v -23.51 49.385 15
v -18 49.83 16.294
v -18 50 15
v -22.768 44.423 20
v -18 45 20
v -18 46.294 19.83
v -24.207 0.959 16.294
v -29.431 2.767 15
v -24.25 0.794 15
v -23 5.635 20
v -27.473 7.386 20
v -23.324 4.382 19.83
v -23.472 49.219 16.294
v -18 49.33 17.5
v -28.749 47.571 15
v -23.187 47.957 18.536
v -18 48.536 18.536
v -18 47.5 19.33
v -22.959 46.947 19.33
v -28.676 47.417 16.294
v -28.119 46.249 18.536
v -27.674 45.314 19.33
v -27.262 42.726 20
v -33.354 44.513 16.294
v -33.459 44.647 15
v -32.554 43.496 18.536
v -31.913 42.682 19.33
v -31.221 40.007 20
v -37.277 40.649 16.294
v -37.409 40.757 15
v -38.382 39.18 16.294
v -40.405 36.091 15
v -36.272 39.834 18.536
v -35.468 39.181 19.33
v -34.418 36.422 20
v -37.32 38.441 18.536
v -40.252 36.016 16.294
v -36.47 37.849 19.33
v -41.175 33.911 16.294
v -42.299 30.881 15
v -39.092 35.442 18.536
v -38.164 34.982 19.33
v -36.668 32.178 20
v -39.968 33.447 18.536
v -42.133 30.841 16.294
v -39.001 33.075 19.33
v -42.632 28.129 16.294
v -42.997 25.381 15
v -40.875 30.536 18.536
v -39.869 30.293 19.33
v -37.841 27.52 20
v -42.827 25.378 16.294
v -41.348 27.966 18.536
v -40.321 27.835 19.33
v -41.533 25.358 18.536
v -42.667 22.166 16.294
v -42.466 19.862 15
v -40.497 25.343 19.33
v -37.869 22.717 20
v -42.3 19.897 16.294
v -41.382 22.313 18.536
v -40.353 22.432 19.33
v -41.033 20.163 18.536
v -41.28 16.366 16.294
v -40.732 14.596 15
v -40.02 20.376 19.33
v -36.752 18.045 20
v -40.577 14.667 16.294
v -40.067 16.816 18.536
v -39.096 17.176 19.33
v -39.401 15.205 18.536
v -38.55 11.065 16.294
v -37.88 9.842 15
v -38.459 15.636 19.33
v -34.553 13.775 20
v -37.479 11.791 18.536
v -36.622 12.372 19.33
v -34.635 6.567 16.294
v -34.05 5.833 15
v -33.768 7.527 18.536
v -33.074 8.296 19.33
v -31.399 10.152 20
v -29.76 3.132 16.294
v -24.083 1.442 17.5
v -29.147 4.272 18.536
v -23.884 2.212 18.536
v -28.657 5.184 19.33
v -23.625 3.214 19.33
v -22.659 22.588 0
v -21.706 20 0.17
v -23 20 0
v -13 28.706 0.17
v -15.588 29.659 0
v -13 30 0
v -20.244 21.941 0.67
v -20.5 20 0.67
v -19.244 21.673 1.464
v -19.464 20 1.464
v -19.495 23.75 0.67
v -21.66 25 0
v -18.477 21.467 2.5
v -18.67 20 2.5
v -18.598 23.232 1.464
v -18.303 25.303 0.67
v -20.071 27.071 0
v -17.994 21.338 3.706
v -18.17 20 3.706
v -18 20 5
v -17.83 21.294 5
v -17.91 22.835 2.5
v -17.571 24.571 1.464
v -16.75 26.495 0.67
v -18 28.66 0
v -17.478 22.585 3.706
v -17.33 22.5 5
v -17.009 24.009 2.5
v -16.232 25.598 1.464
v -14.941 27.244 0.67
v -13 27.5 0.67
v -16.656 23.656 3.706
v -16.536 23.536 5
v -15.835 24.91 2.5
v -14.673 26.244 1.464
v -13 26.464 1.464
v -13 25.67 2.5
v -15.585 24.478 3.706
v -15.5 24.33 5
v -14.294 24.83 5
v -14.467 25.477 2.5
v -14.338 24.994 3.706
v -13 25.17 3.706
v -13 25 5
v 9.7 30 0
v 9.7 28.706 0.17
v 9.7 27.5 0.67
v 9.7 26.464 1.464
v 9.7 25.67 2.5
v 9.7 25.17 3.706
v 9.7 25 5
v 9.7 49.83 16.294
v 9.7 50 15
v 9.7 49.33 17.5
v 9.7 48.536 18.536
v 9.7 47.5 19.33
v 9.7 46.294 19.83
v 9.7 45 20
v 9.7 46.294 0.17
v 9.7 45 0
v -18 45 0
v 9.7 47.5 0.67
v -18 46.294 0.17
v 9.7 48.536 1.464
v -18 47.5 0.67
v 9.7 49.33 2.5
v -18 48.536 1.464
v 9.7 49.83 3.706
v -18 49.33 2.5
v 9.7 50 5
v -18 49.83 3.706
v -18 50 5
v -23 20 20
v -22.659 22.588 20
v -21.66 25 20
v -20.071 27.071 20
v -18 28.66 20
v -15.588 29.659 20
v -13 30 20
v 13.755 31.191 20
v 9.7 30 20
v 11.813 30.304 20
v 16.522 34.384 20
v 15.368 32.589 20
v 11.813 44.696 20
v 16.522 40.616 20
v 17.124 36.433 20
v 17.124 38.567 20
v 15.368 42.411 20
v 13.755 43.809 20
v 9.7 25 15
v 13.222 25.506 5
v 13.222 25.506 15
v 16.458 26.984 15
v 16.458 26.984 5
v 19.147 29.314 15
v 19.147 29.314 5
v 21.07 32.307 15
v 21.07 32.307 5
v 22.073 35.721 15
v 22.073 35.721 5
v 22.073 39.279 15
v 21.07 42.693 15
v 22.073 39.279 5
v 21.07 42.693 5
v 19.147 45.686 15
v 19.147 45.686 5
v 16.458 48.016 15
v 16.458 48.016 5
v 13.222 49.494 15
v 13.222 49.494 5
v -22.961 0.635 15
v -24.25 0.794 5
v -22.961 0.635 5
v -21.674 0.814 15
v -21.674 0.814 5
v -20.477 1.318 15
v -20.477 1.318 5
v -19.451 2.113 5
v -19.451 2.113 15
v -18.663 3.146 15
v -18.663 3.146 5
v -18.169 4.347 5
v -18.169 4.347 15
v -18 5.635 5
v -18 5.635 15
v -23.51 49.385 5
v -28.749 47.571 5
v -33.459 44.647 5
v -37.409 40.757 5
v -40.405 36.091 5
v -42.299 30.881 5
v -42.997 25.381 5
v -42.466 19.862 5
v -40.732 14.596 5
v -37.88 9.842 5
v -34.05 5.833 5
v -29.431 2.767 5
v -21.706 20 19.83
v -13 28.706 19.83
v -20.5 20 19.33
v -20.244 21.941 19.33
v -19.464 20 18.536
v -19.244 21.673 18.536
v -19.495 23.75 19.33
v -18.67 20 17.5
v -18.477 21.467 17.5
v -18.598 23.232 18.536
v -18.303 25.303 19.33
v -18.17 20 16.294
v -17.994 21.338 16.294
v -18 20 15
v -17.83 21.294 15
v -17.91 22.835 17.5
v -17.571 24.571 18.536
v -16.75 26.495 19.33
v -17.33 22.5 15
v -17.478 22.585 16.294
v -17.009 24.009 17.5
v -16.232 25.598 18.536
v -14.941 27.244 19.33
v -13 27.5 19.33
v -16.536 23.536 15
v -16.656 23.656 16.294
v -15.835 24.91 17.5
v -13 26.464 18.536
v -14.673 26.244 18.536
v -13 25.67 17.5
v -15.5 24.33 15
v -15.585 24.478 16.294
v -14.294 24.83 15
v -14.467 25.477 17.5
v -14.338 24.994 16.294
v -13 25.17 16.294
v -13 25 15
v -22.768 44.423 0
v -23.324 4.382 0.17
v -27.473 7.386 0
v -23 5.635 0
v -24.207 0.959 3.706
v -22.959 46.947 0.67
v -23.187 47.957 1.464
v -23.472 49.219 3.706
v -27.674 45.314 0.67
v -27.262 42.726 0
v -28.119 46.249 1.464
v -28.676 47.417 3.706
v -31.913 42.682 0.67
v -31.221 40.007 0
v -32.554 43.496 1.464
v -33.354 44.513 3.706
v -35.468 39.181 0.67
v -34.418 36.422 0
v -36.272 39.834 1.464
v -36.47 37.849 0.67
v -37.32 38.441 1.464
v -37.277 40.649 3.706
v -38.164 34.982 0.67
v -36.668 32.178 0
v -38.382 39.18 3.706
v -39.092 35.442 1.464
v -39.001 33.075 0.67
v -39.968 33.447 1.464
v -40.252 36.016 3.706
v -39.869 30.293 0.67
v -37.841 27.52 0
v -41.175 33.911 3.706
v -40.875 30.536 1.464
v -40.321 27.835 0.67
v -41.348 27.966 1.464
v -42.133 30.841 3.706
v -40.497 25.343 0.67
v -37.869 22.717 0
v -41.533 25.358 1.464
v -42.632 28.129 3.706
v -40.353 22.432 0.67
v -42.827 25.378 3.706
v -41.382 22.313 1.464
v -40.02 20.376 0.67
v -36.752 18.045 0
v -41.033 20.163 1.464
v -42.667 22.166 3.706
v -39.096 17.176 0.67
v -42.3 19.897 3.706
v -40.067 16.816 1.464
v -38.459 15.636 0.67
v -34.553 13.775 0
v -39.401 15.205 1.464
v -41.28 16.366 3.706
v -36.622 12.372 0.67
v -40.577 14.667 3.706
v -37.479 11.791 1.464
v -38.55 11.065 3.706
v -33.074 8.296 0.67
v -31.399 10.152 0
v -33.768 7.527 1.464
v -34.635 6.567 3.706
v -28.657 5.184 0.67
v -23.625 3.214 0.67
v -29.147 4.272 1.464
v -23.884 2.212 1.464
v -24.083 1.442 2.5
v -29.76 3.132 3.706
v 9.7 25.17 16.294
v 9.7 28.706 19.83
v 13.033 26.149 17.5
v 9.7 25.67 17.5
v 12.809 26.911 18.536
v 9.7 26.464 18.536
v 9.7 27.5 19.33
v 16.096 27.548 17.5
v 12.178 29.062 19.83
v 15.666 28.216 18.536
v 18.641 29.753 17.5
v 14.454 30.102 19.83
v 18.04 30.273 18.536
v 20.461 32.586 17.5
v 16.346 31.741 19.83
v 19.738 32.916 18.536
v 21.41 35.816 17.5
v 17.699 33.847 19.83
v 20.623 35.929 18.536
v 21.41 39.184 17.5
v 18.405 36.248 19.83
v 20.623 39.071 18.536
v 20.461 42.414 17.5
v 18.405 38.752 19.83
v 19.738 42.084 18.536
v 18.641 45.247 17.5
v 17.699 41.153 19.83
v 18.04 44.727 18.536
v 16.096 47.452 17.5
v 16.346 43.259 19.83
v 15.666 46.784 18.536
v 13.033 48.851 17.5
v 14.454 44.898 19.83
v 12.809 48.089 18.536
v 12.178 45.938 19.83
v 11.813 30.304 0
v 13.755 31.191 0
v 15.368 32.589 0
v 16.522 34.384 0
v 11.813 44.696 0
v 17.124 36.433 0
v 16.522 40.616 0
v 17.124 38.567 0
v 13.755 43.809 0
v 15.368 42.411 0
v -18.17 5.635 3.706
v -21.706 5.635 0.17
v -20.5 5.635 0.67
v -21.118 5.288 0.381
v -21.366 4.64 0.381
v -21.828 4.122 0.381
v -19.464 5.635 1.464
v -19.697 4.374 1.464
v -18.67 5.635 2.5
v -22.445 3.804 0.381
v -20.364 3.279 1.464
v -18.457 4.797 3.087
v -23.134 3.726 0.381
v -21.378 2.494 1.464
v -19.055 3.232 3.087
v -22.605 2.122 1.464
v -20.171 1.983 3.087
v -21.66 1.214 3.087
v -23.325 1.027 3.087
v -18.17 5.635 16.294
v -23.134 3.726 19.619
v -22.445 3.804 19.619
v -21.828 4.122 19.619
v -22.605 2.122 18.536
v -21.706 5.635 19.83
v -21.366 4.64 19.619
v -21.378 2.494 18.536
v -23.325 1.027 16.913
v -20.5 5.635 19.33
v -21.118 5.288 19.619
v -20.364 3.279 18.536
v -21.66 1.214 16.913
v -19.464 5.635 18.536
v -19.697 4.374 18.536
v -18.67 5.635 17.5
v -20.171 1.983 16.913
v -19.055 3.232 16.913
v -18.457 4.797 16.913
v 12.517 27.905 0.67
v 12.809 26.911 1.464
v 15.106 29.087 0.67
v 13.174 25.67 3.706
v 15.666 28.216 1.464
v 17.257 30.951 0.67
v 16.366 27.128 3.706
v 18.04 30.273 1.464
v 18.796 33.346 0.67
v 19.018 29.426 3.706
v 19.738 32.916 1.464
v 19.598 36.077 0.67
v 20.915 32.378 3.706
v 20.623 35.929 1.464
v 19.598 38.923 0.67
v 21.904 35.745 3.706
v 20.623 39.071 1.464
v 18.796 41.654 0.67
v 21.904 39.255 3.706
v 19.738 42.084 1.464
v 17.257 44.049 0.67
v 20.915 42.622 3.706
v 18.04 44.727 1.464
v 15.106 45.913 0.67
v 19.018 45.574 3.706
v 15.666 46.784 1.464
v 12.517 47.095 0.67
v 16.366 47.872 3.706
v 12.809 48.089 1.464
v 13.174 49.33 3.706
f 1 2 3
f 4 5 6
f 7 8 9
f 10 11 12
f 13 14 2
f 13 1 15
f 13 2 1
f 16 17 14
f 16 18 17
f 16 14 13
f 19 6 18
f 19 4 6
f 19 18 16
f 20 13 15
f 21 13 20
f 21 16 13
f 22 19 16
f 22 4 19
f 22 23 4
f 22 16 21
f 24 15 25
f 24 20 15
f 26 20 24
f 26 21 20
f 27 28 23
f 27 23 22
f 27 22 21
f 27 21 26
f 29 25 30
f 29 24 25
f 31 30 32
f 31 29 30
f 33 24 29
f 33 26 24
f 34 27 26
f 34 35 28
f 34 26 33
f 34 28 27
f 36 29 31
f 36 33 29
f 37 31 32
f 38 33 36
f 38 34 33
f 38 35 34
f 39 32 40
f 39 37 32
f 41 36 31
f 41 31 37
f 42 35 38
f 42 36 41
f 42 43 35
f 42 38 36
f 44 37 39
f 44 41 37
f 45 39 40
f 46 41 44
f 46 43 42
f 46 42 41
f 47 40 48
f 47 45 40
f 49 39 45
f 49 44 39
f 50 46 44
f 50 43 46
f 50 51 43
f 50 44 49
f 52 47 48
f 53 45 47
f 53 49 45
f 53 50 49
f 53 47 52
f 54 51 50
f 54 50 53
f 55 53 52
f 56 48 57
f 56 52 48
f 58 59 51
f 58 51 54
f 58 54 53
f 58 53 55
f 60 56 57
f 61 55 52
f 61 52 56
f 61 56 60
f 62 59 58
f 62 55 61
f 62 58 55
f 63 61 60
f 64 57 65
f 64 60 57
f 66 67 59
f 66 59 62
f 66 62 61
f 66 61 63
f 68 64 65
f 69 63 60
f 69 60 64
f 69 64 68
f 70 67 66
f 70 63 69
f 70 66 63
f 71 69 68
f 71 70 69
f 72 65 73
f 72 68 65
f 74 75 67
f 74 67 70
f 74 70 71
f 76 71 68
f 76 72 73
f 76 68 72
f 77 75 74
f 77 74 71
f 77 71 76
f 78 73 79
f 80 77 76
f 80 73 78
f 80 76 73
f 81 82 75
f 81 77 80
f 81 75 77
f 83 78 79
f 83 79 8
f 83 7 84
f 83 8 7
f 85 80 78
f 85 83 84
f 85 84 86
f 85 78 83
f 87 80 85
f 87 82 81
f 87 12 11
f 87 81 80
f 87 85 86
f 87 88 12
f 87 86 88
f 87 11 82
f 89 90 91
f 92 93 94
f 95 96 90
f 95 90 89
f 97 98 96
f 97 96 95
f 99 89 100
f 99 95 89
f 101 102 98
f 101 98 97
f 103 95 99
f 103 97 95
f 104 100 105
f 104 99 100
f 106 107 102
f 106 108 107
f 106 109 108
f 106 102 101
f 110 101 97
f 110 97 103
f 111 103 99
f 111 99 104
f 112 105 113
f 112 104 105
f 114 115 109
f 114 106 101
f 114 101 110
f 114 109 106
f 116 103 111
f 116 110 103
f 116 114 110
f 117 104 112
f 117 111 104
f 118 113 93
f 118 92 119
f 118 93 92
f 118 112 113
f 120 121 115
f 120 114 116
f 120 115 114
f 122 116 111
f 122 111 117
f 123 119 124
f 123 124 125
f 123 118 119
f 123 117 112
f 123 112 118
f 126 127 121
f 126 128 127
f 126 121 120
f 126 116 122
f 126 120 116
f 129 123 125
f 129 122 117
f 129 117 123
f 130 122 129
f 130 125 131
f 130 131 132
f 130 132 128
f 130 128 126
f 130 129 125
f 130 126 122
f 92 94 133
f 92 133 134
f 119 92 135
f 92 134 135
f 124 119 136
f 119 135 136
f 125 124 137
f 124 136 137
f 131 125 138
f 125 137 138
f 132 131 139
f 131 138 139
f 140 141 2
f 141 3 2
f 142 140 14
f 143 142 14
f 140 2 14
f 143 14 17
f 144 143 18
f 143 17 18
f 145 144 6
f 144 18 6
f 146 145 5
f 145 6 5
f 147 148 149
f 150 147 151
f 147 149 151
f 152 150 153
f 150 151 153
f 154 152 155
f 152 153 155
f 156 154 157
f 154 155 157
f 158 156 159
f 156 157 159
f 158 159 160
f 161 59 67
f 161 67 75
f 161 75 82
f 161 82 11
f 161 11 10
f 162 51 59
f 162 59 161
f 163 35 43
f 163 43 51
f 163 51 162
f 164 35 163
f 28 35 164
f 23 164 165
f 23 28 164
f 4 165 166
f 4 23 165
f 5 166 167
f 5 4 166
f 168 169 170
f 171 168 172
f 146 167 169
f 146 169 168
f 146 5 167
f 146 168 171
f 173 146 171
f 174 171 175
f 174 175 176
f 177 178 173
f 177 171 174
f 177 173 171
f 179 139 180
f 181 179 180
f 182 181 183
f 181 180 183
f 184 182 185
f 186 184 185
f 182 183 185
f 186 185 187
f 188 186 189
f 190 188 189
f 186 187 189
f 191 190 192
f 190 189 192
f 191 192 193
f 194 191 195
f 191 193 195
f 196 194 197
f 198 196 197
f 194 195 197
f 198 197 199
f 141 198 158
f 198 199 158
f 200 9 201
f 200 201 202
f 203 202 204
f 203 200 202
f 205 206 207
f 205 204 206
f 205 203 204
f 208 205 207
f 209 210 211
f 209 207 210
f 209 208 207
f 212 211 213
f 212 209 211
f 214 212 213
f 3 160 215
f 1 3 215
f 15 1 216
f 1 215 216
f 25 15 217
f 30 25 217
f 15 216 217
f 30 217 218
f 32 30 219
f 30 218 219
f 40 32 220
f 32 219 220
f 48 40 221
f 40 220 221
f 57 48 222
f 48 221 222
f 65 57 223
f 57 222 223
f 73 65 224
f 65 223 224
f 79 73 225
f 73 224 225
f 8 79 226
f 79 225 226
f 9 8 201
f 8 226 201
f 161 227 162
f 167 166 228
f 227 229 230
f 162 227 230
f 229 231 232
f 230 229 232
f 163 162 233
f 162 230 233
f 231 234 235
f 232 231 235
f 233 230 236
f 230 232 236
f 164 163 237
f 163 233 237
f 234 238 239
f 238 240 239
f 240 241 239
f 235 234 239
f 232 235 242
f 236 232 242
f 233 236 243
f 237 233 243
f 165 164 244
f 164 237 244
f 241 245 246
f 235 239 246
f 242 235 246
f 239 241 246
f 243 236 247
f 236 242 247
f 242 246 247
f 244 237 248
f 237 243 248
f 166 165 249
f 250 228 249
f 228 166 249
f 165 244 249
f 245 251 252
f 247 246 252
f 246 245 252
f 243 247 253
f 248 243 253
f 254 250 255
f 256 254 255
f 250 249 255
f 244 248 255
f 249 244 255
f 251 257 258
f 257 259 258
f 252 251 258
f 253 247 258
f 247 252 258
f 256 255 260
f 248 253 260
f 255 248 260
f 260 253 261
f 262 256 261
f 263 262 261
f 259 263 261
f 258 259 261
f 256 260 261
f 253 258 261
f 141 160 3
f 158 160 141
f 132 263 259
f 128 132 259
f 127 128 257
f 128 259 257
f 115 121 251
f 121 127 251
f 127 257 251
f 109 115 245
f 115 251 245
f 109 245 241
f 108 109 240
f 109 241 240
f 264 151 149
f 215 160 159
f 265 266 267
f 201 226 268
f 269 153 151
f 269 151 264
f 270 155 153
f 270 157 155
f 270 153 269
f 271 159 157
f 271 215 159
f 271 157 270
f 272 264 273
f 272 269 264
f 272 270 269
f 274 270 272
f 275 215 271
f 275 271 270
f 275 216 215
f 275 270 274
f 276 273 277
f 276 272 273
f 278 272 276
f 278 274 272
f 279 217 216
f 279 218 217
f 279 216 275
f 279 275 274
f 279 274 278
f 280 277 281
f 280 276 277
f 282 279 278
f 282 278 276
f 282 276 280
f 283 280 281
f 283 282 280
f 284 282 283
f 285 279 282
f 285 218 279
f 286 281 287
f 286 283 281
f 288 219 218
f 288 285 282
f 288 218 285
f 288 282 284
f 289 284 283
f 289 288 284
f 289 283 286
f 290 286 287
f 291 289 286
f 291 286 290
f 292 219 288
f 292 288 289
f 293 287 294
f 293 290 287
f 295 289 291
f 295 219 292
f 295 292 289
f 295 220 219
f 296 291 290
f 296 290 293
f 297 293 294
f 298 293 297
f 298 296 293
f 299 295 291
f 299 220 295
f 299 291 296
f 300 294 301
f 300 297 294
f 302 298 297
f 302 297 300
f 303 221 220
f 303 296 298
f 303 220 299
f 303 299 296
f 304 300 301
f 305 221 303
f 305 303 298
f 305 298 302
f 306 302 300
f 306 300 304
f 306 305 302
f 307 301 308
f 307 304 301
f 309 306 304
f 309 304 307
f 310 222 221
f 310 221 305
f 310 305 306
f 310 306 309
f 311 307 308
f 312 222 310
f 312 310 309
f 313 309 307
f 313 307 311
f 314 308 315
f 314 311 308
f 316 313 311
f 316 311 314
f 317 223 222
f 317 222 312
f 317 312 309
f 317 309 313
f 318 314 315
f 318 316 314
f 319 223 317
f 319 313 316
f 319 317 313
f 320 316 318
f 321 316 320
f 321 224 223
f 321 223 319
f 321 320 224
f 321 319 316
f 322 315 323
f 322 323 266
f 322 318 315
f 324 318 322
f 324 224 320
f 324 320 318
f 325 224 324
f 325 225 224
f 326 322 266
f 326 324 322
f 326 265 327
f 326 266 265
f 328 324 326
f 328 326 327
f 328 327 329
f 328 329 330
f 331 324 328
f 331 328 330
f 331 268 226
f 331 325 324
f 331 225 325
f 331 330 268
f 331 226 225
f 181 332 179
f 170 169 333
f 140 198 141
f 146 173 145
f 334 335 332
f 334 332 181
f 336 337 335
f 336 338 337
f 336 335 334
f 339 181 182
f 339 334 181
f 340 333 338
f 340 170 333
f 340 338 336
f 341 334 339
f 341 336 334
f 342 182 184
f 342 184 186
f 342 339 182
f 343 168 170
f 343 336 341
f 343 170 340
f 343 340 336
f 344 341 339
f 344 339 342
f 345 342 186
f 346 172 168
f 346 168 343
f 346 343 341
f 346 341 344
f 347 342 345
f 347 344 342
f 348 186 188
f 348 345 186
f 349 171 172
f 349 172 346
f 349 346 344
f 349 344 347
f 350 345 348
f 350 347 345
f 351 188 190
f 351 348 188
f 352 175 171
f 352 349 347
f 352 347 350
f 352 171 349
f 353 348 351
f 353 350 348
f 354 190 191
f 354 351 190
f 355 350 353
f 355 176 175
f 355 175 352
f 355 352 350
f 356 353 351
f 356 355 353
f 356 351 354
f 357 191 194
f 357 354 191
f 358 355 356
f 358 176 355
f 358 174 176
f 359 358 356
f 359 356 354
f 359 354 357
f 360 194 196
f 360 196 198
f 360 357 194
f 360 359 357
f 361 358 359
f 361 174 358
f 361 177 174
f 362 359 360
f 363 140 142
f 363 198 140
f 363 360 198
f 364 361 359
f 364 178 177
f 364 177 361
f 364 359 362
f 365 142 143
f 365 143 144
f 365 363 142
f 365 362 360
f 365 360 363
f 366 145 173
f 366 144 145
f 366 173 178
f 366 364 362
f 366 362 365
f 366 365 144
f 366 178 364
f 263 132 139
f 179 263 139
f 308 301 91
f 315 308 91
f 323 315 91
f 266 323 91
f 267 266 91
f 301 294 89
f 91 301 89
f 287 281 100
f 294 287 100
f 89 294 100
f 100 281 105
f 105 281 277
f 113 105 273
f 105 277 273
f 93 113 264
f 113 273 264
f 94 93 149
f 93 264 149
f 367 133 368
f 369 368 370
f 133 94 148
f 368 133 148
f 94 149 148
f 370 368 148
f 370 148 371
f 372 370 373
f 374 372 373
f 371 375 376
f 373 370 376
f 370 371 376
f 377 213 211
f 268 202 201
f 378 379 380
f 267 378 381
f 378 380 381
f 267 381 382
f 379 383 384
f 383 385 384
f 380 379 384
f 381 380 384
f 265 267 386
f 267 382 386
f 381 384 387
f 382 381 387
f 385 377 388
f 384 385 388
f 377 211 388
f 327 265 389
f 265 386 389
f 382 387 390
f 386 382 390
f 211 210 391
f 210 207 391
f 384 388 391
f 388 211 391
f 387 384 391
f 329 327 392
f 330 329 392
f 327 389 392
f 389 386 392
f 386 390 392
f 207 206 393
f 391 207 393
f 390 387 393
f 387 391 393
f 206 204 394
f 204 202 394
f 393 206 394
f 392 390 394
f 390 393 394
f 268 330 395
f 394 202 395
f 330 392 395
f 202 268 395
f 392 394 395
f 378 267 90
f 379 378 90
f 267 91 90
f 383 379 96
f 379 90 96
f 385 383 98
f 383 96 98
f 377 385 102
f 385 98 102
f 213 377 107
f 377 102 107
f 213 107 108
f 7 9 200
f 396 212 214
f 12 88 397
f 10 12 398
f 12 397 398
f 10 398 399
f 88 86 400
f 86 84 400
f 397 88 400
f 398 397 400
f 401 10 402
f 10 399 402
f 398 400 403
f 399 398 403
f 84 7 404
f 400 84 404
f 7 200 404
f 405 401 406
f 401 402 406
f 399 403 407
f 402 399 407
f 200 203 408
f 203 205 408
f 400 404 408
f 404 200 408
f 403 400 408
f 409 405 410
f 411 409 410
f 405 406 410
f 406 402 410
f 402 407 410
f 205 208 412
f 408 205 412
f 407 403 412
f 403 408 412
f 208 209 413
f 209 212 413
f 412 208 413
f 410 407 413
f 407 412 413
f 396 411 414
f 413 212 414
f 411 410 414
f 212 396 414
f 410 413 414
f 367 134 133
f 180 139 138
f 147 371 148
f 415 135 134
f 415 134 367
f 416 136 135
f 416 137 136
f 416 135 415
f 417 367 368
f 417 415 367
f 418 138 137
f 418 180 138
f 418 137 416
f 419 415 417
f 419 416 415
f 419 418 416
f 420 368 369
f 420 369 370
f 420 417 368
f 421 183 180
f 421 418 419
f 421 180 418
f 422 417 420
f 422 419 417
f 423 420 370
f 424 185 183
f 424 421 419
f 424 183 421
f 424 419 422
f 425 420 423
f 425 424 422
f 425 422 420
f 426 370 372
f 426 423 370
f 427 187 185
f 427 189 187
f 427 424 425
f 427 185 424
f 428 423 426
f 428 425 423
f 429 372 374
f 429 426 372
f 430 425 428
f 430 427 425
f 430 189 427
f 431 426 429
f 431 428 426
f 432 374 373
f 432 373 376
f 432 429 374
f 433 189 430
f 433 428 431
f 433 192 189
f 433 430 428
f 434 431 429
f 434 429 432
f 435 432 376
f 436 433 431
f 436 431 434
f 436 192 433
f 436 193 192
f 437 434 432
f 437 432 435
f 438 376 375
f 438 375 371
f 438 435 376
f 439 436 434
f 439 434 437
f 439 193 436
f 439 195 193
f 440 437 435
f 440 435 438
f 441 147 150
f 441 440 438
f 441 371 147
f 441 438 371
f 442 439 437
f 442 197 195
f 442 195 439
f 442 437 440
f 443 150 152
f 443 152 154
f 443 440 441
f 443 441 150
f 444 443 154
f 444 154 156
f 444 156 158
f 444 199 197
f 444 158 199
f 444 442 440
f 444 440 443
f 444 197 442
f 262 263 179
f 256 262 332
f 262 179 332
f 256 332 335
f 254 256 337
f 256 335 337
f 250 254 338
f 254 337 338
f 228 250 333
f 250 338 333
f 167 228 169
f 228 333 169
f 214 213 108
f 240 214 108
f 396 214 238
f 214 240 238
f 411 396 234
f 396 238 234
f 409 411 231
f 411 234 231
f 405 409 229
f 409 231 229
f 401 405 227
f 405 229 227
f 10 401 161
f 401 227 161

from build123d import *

# Parameters (mm, degrees)
F0_W     = 27.7
F0_H     = 25
F1_DEPTH = 10
F2_DEPTH = 10
F3_R     = 5


# Not quite as in the source:
# - a feature names something its author has since deleted; it is built from what else it names


with BuildPart() as f1:
    # F0 (on Top) → F1 (new body)
    with BuildSketch(Plane.XY):
        with BuildLine():
            Line((-18, 25), (-18, 50))
            ThreePointArc((-18, 50), (-43, 25), (-18, 0))
            Line((-18, 0), (-18, 25))
        make_face()
        with BuildLine():
            ThreePointArc((9.7, 25), (22.2, 37.5), (9.7, 50))
            Line((9.7, 50), (9.7, 25))
        make_face()
        with Locations((-4.15, 37.5)):
            Rectangle(F0_W, F0_H)
    extrude(amount=F1_DEPTH)

    # F2 (add): a face of the model
    f2_faces = [f1.faces().sort_by_distance(p)[0] for p in [
        (-14.2102397427, 31.107363361, 10),
    ]]
    extrude(f2_faces, amount=F2_DEPTH)

    # F3
    f3_edges = [f1.edges().sort_by_distance(p)[0] for p in [
        (-4.15, 25, 20),
        (9.7, 25, 10),
        (-4.15, 25, 0),
        (-18, 25, 10),
        (-4.15, 50, 20),
        (22.2, 37.5, 20),
        (-43, 25, 20),
        (-18, 12.5, 20),
        (-18, 50, 10),
        (-18, 0, 10),
        (-43, 25, 0),
        (-18, 12.5, 0),
        (22.2, 37.5, 0),
        (-4.15, 50, 0),
    ]]
    fillet(f3_edges, radius=F3_R)


solid = f1.part
